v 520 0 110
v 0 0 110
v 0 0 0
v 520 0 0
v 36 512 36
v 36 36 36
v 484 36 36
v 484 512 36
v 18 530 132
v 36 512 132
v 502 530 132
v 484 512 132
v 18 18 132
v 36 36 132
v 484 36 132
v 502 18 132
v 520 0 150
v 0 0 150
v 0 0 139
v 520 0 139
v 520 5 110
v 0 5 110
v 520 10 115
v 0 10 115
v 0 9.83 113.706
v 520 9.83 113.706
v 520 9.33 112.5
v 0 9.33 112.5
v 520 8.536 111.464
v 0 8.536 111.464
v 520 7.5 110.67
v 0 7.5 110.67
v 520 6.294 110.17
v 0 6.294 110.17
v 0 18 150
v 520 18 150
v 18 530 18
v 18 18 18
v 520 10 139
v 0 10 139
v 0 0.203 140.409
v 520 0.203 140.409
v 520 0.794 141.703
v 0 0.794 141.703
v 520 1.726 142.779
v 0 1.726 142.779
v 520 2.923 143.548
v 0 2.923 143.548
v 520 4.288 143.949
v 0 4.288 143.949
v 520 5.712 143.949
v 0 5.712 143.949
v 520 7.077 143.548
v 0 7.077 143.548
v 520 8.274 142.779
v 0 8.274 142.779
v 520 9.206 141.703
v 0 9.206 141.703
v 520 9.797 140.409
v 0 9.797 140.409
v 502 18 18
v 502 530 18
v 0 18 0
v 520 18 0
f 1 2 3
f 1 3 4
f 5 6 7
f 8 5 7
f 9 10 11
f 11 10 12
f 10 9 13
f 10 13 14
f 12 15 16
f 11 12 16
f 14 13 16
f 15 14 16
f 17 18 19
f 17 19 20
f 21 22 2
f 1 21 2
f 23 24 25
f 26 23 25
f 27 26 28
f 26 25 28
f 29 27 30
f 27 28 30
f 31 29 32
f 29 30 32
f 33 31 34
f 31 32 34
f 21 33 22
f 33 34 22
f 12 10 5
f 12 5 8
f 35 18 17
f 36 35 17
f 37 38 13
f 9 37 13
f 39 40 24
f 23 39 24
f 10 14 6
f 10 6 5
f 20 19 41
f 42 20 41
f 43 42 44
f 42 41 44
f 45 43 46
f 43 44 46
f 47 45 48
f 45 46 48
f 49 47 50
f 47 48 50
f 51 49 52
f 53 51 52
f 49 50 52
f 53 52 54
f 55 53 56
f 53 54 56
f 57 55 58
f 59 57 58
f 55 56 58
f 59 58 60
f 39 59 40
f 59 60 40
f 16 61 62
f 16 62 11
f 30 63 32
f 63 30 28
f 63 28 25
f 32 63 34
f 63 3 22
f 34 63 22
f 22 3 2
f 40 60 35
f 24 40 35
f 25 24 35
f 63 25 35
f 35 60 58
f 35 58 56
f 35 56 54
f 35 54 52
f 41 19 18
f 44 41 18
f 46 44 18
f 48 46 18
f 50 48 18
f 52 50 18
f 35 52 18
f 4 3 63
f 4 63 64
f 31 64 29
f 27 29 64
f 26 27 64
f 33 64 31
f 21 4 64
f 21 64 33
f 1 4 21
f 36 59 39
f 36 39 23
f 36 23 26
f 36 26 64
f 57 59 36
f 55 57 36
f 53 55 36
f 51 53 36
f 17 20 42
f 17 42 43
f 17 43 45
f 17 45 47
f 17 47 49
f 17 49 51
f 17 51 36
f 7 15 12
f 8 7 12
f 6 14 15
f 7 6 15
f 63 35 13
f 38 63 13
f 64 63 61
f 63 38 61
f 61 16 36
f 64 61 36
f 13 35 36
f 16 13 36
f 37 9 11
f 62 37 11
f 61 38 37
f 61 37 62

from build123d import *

# Parameters (mm, degrees)
F0_W     = 520
F0_H     = 150
F0_W_2   = 484
F0_H_2   = 114
F1_DEPTH = 18
F2_DEPTH = 530
F3_W     = 448
F3_H     = 476
F4_DEPTH = 96
F6_DEPTH = 539


with BuildPart() as f1:
    # F0 (on Front) → F1 (new body)
    with BuildSketch(Plane.XZ):
        with Locations((260, 75)):
            Rectangle(F0_W, F0_H)
        with Locations((260, 75)):
            Rectangle(F0_W_2, F0_H_2, mode=Mode.SUBTRACT)
    extrude(amount=-F1_DEPTH)

    # F0 (on Front) → F2 (join)
    with BuildSketch(Plane.XZ):
        with Locations((260, 75)):
            Rectangle(F0_W_2, F0_H_2)
    extrude(amount=-F2_DEPTH)

    # F3 (on face) → F4 (cut)
    with BuildSketch(Plane.XY.offset(132)):
        with Locations((260, 274)):
            Rectangle(F3_W, F3_H)
    extrude(amount=-F4_DEPTH, mode=Mode.SUBTRACT)

    # F5 (on face) → F6 (cut)
    with BuildSketch(Plane(origin=(0, 0, 0), x_dir=(0, -1, 0), z_dir=(-1, 0, 0))):
        with BuildLine():
            Line((-5, 110), (0, 110))
            Line((0, 110), (0, 139))
            ThreePointArc((0, 139), (-5, 144), (-10, 139))
            Line((-10, 139), (-10, 115))
            ThreePointArc((-10, 115), (-8.535534, 111.464466), (-5, 110))
        make_face()
    extrude(amount=-F6_DEPTH, mode=Mode.SUBTRACT)


solid = f1.part
